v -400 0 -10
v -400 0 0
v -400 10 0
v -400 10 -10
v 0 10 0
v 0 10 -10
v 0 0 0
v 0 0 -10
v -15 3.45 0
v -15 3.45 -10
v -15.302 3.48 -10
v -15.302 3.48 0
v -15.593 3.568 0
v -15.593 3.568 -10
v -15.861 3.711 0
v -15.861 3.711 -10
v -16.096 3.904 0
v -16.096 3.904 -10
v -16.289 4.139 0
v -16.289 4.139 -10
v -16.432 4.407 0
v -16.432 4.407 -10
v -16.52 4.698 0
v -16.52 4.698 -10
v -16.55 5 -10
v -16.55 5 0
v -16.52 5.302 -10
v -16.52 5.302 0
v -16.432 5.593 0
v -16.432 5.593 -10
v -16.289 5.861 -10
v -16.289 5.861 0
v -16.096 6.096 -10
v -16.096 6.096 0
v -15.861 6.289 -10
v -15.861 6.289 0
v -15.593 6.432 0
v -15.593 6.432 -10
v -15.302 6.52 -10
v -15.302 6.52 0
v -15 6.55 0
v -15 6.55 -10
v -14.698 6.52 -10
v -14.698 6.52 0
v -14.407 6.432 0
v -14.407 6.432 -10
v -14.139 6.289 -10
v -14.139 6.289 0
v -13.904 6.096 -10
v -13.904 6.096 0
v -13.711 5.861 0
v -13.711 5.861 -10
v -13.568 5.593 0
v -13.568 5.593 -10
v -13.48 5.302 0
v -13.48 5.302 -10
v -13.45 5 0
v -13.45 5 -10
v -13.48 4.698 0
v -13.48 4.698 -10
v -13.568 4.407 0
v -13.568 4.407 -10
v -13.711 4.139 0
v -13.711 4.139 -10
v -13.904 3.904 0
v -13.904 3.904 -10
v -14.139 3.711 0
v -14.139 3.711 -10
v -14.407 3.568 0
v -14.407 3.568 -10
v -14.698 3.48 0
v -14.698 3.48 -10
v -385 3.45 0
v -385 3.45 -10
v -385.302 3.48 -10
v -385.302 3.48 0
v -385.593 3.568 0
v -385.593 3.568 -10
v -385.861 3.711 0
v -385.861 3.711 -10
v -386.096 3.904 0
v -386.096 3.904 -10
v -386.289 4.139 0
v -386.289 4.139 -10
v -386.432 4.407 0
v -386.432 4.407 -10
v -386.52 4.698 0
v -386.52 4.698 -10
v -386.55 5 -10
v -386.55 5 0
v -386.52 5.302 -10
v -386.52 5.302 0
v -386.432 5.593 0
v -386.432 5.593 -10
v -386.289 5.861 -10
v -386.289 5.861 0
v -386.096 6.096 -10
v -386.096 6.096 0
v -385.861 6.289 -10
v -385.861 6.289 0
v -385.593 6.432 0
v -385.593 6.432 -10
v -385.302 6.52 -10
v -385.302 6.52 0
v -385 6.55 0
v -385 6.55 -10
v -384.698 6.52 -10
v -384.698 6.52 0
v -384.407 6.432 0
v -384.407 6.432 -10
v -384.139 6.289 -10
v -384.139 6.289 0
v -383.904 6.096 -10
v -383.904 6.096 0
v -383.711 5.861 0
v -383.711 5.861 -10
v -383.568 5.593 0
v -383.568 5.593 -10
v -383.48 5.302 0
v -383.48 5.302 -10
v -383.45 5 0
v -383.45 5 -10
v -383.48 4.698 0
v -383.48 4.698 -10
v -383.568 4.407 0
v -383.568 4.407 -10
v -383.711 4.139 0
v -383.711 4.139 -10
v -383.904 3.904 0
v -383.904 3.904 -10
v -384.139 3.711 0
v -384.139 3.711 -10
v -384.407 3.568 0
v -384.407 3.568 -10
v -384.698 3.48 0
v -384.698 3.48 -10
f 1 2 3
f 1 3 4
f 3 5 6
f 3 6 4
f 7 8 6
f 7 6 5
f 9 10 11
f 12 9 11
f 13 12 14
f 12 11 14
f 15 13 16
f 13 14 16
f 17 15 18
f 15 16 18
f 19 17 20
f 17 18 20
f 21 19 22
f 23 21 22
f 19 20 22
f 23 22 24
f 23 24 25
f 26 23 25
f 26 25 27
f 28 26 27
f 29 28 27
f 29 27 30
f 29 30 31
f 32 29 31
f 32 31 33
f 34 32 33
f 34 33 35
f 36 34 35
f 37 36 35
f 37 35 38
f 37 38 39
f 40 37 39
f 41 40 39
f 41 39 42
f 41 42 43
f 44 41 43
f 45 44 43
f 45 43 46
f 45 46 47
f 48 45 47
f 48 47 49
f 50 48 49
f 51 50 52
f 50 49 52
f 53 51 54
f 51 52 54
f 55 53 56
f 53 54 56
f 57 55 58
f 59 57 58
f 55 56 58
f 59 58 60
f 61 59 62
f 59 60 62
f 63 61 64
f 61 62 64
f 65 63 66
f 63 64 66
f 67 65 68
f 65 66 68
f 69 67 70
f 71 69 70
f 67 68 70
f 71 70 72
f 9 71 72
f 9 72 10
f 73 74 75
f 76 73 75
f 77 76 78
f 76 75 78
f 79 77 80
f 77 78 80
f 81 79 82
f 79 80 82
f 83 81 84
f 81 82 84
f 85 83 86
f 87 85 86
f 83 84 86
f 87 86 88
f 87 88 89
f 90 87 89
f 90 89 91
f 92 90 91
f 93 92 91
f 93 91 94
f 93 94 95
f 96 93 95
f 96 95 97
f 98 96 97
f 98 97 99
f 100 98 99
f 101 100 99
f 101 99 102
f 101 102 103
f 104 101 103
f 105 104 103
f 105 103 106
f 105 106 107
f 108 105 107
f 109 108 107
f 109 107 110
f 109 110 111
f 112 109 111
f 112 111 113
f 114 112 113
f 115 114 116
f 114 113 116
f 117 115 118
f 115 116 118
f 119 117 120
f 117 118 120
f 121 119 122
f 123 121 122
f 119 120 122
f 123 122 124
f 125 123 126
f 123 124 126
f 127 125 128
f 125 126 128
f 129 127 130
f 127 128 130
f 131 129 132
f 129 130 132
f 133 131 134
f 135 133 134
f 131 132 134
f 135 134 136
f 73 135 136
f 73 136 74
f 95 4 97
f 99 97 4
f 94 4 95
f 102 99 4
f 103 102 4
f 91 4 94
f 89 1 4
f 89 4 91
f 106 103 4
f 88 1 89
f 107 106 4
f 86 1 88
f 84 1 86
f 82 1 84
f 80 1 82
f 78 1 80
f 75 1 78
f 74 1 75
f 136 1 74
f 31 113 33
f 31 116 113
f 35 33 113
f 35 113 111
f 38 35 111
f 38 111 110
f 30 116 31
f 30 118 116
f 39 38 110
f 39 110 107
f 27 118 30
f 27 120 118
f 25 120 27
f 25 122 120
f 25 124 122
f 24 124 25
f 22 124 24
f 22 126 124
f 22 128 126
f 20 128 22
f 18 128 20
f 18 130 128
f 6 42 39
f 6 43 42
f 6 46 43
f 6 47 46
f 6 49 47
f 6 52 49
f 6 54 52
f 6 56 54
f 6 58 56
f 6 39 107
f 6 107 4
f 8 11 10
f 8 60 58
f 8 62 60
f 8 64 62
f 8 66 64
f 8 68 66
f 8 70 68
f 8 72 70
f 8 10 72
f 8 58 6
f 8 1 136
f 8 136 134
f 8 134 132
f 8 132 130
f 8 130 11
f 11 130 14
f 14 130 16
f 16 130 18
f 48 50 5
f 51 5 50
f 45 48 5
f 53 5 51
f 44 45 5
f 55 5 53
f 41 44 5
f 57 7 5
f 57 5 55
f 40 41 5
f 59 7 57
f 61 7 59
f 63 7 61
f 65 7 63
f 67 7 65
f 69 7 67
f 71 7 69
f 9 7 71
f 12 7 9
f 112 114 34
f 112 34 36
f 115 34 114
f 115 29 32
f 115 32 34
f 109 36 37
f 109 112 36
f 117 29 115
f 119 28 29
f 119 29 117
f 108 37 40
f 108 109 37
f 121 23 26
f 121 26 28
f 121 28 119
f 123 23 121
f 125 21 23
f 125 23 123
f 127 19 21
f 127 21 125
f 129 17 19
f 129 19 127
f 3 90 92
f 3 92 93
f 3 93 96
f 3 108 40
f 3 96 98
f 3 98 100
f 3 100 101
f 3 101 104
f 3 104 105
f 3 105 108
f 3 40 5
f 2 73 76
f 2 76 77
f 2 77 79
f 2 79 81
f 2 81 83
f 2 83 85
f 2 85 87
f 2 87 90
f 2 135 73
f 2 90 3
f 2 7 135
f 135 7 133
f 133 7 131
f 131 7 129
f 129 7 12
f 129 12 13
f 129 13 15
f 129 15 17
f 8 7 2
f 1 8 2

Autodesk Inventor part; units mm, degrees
ref_plane "YZ Plane" through (0, 0, 0) normal (1, 0, 0) x (0, 1, 0)
ref_plane "XZ Plane" through (0, 0, 0) normal (0, 1, 0) x (-1, 0, 0)
ref_plane "XY Plane" through (0, 0, 0) normal (0, 0, 1) x (1, 0, 0)
sketch "スケッチ1" plane through (0, 0, 0) normal (0, 1, 0) x (-1, 0, 0)
  line L0 (0, 0) -> (400, 0)
  line L1 (400, 0) -> (400, -10)
  line L2 (400, -10) -> (0, -10)
  line L3 (0, -10) -> (0, 0)
  dimension "d0" = 400
  dimension "d1" = 10
extrude "押し出し1" add sketch "スケッチ1" along normal blind 10
sketch "スケッチ5" plane through (-400, 0, 0) normal (0, 0, 1) x (1, 0, 0)
  line L0 (400, 0) -> (400, 10) projected
  line L1 (0, 0) -> (0, 10) projected
  point P0 (385, 5)
  point P1 (15, 5)
  point P2 (400, 5)
  point P3 (400, 5)
  point P4 (0, 5)
  dimension "d13" = 15
  dimension "d14" = 15
hole "穴2" at (-15, 5, 0) at (-385, 5, 0) direction (0, 0, -1) diameter 3.1 end through all
properties part number "Yoko"
